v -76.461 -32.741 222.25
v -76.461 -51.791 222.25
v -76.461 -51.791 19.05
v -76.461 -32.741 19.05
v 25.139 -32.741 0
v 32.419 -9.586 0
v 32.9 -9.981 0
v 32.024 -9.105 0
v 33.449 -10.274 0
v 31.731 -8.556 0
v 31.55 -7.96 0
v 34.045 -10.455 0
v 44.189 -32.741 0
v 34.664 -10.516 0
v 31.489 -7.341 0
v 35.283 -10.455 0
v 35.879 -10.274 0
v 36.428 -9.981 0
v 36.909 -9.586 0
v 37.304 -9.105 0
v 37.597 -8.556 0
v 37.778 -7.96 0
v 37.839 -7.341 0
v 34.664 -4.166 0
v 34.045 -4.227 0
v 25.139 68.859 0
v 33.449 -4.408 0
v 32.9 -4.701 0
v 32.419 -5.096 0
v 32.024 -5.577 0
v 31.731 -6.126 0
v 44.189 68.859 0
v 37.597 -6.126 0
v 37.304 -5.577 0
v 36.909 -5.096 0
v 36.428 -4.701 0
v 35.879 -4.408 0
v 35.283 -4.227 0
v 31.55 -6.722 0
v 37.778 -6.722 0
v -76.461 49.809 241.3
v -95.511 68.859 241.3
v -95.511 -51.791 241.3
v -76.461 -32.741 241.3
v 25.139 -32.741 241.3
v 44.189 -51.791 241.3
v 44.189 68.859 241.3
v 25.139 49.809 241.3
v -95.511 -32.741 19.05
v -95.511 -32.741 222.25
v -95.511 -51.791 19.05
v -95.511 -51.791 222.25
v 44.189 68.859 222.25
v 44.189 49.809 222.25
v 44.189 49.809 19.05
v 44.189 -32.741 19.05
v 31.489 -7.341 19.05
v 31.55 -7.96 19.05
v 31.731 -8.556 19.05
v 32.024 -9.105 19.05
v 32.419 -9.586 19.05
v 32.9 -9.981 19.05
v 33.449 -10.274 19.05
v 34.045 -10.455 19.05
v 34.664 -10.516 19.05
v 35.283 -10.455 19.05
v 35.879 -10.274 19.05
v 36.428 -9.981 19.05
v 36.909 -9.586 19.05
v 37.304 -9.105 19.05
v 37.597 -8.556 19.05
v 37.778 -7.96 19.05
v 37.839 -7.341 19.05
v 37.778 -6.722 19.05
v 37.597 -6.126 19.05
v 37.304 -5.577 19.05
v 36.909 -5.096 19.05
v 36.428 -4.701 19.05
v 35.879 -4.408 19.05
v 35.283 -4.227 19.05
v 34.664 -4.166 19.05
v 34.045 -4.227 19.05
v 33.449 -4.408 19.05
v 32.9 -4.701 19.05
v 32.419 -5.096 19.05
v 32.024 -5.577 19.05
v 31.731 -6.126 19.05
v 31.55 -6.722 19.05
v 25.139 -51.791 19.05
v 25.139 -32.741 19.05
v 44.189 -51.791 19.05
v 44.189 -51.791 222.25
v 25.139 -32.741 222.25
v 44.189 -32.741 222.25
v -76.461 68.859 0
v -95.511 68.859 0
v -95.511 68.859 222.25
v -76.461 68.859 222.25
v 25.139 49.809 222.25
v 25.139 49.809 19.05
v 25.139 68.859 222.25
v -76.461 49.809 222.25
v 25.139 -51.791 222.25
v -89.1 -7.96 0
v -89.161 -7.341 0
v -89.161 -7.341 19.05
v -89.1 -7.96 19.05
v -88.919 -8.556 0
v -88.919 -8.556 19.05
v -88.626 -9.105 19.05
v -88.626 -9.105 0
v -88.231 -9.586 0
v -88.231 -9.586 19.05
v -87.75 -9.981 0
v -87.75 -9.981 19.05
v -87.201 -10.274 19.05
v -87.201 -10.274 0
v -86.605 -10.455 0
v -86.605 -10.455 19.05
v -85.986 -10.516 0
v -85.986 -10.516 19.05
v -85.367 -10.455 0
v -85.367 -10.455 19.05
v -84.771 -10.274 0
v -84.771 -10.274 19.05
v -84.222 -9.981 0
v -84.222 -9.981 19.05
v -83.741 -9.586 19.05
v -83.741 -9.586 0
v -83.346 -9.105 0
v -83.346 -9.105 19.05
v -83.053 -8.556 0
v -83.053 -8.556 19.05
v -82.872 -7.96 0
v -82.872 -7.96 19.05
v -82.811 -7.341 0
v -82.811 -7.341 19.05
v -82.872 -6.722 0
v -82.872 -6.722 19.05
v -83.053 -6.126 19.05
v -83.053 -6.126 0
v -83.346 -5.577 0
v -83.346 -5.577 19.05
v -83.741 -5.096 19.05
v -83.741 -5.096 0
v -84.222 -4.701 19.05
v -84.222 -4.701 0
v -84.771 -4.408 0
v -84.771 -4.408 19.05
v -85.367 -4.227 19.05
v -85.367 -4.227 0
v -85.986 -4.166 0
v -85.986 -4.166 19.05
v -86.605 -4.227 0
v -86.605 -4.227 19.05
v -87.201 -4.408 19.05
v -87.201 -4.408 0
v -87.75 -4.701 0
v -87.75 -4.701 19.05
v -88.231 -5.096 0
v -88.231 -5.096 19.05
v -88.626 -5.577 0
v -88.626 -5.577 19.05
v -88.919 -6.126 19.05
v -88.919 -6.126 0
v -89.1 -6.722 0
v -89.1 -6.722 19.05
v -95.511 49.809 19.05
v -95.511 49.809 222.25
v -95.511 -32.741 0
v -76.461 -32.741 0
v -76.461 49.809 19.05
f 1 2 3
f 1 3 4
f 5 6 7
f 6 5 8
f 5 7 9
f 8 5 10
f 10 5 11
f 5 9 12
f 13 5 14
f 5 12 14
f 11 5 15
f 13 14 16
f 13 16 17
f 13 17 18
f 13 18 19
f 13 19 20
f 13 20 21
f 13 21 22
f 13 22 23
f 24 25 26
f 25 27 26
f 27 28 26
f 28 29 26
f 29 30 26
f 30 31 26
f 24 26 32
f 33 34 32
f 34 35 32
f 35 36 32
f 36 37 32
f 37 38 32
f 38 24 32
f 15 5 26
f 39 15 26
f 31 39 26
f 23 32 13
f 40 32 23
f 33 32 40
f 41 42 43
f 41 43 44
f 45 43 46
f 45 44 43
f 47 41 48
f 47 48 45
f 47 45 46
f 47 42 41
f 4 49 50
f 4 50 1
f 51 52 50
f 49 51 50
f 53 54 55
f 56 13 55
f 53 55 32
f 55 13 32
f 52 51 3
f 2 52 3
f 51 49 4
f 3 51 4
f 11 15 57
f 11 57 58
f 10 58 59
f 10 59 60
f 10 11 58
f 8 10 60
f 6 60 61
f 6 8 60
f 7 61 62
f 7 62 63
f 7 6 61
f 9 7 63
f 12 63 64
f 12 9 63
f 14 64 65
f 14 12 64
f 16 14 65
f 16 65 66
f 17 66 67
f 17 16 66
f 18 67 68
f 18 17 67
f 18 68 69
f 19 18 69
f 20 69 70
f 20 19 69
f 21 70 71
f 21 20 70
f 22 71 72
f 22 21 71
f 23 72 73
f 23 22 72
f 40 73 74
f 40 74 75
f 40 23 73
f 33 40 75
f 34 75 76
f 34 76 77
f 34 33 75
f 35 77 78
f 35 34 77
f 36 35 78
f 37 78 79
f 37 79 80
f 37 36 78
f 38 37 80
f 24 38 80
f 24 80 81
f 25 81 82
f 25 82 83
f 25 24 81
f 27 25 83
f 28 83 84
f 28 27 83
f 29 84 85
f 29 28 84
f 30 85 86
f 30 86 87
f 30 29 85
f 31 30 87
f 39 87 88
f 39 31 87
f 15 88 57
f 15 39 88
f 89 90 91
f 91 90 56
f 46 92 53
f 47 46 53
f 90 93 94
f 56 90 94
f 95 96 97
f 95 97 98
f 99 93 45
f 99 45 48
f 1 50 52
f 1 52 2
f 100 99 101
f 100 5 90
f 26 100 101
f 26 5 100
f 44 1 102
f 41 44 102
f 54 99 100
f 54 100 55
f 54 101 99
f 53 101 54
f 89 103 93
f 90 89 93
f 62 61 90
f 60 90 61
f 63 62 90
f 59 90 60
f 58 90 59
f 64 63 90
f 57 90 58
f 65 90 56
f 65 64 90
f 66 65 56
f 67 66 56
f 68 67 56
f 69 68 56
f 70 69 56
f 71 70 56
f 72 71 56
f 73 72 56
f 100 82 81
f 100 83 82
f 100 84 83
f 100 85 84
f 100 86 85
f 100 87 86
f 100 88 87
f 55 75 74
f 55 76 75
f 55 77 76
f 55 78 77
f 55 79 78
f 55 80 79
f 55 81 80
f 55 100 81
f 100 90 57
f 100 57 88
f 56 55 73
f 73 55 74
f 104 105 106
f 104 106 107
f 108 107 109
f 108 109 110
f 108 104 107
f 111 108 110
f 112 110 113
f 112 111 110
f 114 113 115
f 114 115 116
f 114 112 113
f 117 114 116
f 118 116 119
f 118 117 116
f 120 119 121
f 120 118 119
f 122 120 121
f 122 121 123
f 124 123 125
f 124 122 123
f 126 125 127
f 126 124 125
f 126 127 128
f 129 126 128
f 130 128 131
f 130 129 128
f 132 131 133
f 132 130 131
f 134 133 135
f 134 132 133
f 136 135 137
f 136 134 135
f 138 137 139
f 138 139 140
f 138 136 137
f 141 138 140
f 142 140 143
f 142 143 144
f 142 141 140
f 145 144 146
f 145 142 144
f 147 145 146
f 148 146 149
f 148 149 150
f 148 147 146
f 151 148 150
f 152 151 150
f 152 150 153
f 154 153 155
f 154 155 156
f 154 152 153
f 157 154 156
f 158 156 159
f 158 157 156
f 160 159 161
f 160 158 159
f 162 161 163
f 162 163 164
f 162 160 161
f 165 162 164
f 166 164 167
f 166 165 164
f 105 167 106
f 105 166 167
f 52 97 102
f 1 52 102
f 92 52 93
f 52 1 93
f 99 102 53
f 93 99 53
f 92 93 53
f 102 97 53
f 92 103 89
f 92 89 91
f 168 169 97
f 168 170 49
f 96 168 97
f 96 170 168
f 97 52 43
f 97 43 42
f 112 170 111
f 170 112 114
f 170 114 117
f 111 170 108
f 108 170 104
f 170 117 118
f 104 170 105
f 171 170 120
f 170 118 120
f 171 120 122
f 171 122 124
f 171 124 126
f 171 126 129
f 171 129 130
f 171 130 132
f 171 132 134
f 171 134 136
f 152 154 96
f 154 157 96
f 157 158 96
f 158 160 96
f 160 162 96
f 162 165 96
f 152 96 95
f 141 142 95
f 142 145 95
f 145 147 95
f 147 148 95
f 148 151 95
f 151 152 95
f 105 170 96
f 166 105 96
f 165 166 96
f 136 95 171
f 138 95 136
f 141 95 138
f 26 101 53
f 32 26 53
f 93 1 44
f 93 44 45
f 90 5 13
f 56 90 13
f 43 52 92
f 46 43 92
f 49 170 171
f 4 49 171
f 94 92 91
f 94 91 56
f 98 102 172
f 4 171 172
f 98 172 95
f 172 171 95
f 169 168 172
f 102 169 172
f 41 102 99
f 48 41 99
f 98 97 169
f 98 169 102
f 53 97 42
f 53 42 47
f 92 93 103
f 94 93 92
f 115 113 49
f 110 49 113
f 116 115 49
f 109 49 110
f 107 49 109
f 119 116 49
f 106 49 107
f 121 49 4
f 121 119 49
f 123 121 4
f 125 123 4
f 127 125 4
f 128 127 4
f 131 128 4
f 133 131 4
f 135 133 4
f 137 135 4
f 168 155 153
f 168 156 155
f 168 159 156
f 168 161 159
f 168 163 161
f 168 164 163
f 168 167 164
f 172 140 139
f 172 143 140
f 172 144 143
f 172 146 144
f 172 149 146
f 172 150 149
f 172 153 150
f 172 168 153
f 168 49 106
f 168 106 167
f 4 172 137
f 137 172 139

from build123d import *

# Parameters (mm, degrees)
SKETCH2_W             = 19.05
SKETCH2_H             = 101.6
SKETCH2_R             = 3.175
BOSS_EXTRUDE1_DEPTH   = 19.05
BOSS_EXTRUDE1_2_DEPTH = 19.05
SKETCH3_W             = 19.05
SKETCH3_H             = 19.05
BOSS_EXTRUDE2_DEPTH   = 203.2
SKETCH4_W             = 139.7
SKETCH4_H             = 120.65
SKETCH4_W_2           = 101.6
SKETCH4_H_2           = 82.55
BOSS_EXTRUDE6_DEPTH   = 19.05


with BuildPart() as part:
    # Sketch2 → Boss-Extrude1 (new body)
    with BuildSketch(Plane.XY):
        with Locations((-85.985987313, 18.059079762)):
            Rectangle(SKETCH2_W, SKETCH2_H)
        with Locations(Location((-85.985987313, -7.340920238, 0), (0, 0, 180))):
            Circle(SKETCH2_R, mode=Mode.SUBTRACT)
    extrude(amount=BOSS_EXTRUDE1_DEPTH)



with BuildPart() as body_2:
    # Sketch2 → Boss-Extrude1 2 (new body)
    with BuildSketch(Plane.XY):
        with Locations((34.664012687, 18.059079762)):
            Rectangle(SKETCH2_W, SKETCH2_H)
        with Locations(Location((34.664012687, -7.340920238, 0), (0, 0, 180))):
            Circle(SKETCH2_R, mode=Mode.SUBTRACT)
    extrude(amount=BOSS_EXTRUDE1_2_DEPTH)


with BuildPart() as part_1:
    add(part.part)

    add(body_2.part)  # Boss-Extrude2 merges body 2
    # Sketch3 → Boss-Extrude2 (add)
    with BuildSketch(Plane.XY.offset(19.05)):
        with Locations((-85.985987313, 59.334079762)):
            Rectangle(SKETCH3_W, SKETCH3_H)
        with Locations((34.664012687, 59.334079762)):
            Rectangle(SKETCH3_W, SKETCH3_H)
        with Locations((-85.985987313, -42.265920238)):
            Rectangle(SKETCH3_W, SKETCH3_H)
        with Locations((34.664012687, -42.265920238)):
            Rectangle(SKETCH3_W, SKETCH3_H)
    extrude(amount=BOSS_EXTRUDE2_DEPTH)


with BuildPart() as body_2_2:
    # Sketch4 → Boss-Extrude6 (new body)
    with BuildSketch(Plane.XY.offset(222.25)):
        with Locations((-25.660987313, 8.534079762)):
            Rectangle(SKETCH4_W, SKETCH4_H)
        with Locations((-25.660987313, 8.534079762)):
            Rectangle(SKETCH4_W_2, SKETCH4_H_2, mode=Mode.SUBTRACT)
    extrude(amount=BOSS_EXTRUDE6_DEPTH)


solid = Compound([part_1.part, body_2_2.part])
